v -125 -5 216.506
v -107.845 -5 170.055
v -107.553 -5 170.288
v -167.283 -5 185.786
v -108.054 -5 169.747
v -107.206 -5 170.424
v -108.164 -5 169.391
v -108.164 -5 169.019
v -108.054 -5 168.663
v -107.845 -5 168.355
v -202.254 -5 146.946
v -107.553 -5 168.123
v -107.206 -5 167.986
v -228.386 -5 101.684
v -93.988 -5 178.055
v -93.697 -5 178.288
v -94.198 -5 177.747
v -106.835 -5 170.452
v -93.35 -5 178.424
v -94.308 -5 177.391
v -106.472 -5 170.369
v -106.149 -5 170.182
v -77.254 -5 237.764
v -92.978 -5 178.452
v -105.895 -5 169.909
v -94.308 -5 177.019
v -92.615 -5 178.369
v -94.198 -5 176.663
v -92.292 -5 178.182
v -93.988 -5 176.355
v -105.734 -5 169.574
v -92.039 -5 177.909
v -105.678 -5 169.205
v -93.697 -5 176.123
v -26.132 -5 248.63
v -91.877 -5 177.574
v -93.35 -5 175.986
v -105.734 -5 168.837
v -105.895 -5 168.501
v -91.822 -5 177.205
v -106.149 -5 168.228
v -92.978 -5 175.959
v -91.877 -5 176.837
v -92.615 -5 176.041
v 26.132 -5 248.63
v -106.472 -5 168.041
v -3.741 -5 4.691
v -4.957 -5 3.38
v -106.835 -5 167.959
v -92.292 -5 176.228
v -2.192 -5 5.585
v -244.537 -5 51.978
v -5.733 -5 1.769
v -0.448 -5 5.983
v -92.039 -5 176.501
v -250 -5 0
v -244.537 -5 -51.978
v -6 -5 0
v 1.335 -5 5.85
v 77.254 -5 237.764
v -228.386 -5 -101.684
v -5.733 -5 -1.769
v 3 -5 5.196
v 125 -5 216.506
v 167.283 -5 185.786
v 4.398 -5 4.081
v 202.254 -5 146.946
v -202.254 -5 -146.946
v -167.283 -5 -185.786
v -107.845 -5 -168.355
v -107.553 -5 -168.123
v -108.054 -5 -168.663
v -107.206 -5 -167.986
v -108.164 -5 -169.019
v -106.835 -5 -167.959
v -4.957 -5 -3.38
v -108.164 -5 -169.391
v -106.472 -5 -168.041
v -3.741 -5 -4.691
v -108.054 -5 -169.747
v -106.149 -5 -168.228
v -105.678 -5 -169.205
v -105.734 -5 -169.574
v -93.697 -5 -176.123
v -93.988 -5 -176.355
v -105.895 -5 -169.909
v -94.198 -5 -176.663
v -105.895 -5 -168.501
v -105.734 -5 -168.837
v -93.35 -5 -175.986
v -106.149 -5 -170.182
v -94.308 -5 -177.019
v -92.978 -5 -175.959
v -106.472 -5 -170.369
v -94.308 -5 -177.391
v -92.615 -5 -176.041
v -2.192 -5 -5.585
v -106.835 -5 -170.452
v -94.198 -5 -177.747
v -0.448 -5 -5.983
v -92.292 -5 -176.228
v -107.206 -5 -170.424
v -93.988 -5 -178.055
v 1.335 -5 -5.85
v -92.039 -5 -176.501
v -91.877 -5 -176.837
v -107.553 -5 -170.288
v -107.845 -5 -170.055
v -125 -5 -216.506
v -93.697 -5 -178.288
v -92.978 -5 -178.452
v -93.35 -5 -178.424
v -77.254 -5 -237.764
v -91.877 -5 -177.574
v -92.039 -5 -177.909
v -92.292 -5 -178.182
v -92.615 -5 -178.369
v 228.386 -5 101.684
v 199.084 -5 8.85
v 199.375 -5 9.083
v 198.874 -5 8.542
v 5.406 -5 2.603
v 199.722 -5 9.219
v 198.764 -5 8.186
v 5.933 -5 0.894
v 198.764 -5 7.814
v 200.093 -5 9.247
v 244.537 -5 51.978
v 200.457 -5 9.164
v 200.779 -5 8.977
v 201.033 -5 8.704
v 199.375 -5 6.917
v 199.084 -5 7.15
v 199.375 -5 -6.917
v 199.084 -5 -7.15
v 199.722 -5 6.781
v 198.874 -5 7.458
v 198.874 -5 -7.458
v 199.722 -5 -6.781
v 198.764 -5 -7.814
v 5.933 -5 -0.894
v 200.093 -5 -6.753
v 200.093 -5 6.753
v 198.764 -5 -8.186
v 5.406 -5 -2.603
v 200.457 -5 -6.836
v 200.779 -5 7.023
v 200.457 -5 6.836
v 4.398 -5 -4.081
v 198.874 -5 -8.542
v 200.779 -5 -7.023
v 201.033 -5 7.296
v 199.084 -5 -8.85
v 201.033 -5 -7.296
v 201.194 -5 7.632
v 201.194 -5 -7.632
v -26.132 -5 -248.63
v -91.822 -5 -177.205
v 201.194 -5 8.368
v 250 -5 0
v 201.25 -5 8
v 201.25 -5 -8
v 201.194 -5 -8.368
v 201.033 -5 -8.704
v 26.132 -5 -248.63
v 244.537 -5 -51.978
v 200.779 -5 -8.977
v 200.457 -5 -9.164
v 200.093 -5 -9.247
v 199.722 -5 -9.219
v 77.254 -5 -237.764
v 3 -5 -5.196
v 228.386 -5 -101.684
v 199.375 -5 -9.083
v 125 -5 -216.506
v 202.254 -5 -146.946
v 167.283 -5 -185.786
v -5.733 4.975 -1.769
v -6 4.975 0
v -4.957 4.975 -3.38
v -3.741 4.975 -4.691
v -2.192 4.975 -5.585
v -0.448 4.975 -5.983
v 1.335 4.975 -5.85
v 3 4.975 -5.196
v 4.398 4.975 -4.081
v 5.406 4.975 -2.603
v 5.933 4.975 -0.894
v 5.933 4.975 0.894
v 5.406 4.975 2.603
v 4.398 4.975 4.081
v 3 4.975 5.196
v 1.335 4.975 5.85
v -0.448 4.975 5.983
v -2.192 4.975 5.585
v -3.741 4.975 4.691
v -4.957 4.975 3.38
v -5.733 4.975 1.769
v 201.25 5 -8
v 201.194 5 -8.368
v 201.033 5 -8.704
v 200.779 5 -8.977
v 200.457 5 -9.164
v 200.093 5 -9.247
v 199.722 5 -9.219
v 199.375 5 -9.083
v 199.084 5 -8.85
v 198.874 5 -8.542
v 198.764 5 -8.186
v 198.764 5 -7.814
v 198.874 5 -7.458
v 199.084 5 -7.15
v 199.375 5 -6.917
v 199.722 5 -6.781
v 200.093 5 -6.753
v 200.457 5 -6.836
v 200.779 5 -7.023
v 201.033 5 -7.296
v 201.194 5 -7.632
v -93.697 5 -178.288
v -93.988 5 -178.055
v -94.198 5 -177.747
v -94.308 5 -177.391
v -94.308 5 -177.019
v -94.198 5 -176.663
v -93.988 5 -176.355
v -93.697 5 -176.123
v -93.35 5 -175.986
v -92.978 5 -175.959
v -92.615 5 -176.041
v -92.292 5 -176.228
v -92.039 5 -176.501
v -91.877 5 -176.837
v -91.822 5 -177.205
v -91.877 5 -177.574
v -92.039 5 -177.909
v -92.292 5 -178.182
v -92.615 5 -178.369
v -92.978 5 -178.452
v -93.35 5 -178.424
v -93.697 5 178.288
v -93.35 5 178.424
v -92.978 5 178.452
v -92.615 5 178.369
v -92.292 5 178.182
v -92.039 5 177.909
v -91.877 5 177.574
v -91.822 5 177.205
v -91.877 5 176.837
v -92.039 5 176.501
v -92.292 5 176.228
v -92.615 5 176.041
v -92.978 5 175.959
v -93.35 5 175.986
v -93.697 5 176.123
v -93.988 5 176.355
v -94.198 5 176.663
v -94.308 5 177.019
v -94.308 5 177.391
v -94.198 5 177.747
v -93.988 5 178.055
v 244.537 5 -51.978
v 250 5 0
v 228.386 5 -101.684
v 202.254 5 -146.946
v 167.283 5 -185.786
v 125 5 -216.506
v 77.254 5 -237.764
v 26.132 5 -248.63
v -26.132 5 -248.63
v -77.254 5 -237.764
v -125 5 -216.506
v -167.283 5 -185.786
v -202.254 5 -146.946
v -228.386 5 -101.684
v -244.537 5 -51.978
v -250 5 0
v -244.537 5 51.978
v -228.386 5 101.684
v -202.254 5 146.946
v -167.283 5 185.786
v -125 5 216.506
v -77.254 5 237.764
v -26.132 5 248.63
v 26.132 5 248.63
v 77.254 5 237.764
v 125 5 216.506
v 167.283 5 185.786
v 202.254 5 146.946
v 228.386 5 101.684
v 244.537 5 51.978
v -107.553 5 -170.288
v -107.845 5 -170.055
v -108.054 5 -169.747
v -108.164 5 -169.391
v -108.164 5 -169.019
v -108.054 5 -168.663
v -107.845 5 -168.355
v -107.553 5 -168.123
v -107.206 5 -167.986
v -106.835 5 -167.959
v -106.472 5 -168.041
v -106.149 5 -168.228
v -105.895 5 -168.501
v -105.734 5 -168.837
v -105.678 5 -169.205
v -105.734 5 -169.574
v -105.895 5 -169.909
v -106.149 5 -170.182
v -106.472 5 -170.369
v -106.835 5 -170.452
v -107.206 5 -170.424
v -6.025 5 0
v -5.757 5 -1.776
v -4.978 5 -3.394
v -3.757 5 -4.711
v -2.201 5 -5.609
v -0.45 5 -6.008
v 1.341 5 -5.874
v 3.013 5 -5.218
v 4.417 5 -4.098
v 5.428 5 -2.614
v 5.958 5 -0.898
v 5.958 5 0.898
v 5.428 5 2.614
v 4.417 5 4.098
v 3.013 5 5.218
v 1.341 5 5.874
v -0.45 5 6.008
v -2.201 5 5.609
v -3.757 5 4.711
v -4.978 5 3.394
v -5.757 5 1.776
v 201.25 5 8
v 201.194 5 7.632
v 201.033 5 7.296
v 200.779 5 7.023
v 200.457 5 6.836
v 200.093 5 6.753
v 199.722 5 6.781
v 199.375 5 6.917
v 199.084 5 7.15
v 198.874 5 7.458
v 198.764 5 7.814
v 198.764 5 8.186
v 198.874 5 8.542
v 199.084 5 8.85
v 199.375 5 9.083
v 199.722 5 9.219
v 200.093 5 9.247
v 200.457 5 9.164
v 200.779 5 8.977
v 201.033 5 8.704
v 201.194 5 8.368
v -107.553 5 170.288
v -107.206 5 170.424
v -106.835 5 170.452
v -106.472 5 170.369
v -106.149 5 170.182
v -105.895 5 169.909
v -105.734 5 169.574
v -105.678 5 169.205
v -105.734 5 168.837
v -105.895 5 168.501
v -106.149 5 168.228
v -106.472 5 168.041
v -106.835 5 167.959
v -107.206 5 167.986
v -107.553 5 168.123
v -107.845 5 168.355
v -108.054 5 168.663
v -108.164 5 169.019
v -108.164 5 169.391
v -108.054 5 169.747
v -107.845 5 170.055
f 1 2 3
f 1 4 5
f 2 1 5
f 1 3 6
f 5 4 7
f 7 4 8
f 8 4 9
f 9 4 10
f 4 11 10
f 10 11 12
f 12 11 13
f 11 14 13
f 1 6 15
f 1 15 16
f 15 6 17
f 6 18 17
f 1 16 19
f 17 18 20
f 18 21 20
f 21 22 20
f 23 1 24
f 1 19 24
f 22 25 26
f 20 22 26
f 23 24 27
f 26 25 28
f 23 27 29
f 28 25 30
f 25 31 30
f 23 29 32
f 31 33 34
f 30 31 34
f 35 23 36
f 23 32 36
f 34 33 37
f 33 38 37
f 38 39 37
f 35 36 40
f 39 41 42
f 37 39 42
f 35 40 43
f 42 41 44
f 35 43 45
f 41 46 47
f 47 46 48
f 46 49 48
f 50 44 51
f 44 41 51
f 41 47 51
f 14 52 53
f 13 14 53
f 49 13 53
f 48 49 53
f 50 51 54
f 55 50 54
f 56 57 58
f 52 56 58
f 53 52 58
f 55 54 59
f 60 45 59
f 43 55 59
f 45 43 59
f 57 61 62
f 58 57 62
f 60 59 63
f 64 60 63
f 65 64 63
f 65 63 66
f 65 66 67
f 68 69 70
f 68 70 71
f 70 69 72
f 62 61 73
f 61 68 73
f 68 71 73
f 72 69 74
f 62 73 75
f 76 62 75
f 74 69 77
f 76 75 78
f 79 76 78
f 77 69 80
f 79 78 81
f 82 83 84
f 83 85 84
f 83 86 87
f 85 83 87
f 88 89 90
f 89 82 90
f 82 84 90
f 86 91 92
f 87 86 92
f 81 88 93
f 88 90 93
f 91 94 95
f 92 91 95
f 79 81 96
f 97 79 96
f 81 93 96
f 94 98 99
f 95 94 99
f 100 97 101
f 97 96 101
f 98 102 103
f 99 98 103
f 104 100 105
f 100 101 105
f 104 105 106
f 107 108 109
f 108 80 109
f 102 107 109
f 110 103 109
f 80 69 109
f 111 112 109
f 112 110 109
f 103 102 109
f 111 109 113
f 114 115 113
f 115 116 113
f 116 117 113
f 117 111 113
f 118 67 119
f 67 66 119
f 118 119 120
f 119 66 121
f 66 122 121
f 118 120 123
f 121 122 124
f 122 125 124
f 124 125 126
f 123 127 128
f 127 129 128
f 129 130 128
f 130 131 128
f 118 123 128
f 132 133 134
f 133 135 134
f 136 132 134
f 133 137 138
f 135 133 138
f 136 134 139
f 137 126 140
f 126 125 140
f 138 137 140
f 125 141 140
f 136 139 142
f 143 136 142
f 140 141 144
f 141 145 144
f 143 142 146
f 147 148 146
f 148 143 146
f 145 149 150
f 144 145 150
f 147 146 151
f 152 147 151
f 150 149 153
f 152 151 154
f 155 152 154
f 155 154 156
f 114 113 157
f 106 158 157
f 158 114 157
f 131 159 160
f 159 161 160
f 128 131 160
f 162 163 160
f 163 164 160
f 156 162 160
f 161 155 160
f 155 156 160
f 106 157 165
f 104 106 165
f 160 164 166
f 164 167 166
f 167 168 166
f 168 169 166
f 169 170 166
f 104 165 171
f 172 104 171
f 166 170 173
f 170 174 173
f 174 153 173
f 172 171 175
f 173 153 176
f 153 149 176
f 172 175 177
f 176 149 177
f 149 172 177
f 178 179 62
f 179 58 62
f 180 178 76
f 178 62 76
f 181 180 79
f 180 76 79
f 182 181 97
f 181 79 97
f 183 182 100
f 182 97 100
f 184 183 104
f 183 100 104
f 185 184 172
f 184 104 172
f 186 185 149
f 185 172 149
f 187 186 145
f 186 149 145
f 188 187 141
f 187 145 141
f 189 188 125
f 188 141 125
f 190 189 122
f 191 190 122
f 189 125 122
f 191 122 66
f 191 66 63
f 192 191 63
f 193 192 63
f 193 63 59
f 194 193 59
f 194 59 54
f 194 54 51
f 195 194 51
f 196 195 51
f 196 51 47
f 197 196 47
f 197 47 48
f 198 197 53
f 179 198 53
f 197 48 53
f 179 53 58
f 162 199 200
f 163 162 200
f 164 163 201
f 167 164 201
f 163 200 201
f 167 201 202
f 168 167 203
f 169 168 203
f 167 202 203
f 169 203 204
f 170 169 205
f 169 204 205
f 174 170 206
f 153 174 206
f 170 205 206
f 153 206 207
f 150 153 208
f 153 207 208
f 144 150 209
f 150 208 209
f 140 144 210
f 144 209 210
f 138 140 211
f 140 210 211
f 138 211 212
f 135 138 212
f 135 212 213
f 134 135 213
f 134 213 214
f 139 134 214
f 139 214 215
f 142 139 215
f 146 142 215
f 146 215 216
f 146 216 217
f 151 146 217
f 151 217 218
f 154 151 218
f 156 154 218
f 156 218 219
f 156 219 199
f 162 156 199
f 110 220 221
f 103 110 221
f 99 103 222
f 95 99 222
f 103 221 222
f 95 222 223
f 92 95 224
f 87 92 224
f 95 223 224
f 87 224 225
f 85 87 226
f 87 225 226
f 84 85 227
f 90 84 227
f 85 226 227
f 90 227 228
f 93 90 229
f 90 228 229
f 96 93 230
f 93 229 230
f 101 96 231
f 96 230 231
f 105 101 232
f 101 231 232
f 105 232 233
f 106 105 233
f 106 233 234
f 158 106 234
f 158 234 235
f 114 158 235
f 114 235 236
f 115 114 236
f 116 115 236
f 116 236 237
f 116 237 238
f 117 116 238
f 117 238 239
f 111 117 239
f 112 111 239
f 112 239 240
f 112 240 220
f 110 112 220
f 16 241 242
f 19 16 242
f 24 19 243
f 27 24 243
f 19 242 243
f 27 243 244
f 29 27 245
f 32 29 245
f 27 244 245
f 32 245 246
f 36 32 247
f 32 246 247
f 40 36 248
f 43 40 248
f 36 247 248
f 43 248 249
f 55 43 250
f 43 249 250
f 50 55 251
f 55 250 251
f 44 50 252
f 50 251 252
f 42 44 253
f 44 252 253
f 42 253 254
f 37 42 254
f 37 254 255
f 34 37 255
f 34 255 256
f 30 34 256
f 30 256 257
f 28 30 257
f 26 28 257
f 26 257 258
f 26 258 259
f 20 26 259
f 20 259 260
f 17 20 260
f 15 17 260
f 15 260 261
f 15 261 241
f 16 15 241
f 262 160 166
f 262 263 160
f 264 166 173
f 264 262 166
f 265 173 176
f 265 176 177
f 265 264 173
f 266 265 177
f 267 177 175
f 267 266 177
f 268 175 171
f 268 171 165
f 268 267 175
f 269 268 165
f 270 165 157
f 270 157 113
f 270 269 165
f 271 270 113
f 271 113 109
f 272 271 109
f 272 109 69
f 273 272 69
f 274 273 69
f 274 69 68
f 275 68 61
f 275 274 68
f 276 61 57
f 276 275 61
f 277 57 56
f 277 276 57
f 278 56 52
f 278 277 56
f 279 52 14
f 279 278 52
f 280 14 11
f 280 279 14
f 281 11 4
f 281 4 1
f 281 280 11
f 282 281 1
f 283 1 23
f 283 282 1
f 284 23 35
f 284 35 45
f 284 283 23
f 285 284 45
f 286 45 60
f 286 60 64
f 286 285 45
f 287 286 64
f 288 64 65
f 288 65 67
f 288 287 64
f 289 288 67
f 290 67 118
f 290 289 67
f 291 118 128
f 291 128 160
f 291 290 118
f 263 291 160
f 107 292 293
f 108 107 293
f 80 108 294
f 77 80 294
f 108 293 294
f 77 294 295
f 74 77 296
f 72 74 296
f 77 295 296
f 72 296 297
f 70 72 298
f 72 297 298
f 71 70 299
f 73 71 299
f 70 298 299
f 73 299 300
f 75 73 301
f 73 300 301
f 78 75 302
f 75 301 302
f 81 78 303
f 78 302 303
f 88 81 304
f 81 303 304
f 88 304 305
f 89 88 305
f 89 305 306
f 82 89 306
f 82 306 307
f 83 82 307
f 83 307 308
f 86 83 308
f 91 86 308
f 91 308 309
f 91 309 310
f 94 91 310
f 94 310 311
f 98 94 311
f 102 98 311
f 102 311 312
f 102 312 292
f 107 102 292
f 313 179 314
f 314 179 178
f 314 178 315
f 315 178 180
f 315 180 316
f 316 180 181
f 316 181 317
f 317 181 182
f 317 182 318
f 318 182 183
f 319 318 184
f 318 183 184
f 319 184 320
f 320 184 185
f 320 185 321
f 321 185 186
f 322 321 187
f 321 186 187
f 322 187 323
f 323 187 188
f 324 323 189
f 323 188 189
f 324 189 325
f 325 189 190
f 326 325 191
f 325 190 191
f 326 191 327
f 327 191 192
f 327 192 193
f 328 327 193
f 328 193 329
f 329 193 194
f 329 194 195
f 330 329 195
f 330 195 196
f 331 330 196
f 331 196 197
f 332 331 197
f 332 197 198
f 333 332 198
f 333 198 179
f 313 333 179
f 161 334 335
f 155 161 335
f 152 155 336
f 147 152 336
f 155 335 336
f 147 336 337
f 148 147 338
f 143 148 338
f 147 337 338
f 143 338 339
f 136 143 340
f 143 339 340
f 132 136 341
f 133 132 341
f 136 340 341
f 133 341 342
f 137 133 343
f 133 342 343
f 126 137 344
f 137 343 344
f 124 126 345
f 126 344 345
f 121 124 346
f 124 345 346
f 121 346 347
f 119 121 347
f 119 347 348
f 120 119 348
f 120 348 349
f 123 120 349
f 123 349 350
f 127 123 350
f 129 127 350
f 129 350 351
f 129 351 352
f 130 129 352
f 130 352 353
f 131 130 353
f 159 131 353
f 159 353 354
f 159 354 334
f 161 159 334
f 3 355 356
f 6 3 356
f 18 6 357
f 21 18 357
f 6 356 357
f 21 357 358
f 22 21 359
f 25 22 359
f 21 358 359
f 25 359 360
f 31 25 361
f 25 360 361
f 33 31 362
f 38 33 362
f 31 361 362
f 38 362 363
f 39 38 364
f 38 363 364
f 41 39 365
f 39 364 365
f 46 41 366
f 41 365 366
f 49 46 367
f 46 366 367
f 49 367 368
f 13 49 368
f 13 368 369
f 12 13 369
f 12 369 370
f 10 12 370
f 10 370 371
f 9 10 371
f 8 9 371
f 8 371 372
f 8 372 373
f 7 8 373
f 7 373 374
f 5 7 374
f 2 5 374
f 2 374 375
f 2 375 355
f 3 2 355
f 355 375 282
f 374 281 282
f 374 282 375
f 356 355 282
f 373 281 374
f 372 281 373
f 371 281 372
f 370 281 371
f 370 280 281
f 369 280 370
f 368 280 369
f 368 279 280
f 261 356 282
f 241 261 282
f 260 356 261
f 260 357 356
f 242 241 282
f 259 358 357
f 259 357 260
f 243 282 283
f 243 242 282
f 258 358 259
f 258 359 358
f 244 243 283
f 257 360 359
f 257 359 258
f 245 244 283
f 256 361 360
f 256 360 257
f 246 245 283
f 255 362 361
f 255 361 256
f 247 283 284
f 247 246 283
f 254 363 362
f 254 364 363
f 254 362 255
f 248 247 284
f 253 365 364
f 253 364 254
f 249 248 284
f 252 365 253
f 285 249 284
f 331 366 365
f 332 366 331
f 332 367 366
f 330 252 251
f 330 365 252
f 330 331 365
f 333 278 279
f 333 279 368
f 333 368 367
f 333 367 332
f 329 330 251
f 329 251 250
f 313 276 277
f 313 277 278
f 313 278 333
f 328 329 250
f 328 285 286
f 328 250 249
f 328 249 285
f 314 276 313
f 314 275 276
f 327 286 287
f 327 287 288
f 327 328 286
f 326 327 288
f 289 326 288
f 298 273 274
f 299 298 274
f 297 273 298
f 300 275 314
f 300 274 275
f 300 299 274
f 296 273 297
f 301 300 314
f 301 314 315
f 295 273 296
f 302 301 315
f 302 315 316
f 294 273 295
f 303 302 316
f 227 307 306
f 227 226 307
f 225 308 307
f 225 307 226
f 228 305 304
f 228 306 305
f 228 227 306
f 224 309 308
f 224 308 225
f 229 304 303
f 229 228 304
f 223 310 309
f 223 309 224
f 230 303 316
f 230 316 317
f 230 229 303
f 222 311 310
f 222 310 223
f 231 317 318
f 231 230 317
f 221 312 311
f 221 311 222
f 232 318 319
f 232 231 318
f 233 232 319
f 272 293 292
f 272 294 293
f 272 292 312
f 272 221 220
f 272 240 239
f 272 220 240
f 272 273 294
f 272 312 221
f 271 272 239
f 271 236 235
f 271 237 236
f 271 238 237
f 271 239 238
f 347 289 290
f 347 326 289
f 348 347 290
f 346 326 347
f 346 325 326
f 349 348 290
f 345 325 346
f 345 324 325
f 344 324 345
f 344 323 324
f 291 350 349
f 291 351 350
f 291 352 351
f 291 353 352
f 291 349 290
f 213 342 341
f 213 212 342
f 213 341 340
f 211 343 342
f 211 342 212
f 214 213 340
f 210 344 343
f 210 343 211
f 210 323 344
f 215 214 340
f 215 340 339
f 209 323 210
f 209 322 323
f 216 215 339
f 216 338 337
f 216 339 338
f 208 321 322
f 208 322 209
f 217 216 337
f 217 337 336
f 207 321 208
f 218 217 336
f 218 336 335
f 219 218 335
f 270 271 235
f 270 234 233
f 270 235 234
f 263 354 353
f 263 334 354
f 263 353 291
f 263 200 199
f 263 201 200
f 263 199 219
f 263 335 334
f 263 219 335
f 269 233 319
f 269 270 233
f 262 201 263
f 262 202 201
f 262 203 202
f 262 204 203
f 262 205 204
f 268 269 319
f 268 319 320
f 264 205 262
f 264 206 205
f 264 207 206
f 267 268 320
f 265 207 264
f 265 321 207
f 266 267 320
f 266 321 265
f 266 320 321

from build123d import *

# Parameters (mm, degrees)
ESQUISSE1_R                  = 250
BOSS_EXTRU_1_DEPTH           = 5
D_GAGEMENT_M101_D            = 12
D_GAGEMENT_M101_CSINK_D      = 12.05
D_GAGEMENT_M101_CSINK_ANGLE  = 90
ESQUISSE6_R                  = 1.25
ENL_V_MAT_EXTRU_1_DEPTH      = 11
R_P_TITION_CIRCULAIRE1_COUNT = 3


with BuildPart() as part:
    # Esquisse1 → Boss.-Extru.1 (new body, symmetric)
    with BuildSketch(Plane(origin=(0, 0, 0), x_dir=(1, 0, 0), z_dir=(0, 1, 0))):
        Circle(ESQUISSE1_R)
    extrude(amount=BOSS_EXTRU_1_DEPTH, both=True)

    # Dégagement M101 (through all)
    with Locations(Plane(origin=(0, 5, 0), x_dir=(1, 0, 0), z_dir=(0, 1, 0))):
        with Locations((0, 0)):
            CounterSinkHole(D_GAGEMENT_M101_D / 2, D_GAGEMENT_M101_CSINK_D / 2, counter_sink_angle=D_GAGEMENT_M101_CSINK_ANGLE)

    # Esquisse6 → Enlèv. mat.-Extru.1 (cut, through all)
    with BuildSketch(Plane(origin=(0, 5, 0), x_dir=(1, 0, 0), z_dir=(0, 1, 0))):
        with Locations((200, 8)):
            Circle(ESQUISSE6_R)
        with Locations((200, -8)):
            Circle(ESQUISSE6_R)
    enl_v_mat_extru_1 = extrude(amount=-ENL_V_MAT_EXTRU_1_DEPTH, mode=Mode.SUBTRACT)

    # Répétition circulaire1: Enlèv. mat.-Extru.1 ×3 about axis
    r_p_tition_circulaire1_axis = Axis((0, 0, 0), (0, 1, 0))
    for i in range(1, R_P_TITION_CIRCULAIRE1_COUNT):
        add(enl_v_mat_extru_1.rotate(r_p_tition_circulaire1_axis, i * 360 / R_P_TITION_CIRCULAIRE1_COUNT), mode=Mode.SUBTRACT)


solid = part.part
